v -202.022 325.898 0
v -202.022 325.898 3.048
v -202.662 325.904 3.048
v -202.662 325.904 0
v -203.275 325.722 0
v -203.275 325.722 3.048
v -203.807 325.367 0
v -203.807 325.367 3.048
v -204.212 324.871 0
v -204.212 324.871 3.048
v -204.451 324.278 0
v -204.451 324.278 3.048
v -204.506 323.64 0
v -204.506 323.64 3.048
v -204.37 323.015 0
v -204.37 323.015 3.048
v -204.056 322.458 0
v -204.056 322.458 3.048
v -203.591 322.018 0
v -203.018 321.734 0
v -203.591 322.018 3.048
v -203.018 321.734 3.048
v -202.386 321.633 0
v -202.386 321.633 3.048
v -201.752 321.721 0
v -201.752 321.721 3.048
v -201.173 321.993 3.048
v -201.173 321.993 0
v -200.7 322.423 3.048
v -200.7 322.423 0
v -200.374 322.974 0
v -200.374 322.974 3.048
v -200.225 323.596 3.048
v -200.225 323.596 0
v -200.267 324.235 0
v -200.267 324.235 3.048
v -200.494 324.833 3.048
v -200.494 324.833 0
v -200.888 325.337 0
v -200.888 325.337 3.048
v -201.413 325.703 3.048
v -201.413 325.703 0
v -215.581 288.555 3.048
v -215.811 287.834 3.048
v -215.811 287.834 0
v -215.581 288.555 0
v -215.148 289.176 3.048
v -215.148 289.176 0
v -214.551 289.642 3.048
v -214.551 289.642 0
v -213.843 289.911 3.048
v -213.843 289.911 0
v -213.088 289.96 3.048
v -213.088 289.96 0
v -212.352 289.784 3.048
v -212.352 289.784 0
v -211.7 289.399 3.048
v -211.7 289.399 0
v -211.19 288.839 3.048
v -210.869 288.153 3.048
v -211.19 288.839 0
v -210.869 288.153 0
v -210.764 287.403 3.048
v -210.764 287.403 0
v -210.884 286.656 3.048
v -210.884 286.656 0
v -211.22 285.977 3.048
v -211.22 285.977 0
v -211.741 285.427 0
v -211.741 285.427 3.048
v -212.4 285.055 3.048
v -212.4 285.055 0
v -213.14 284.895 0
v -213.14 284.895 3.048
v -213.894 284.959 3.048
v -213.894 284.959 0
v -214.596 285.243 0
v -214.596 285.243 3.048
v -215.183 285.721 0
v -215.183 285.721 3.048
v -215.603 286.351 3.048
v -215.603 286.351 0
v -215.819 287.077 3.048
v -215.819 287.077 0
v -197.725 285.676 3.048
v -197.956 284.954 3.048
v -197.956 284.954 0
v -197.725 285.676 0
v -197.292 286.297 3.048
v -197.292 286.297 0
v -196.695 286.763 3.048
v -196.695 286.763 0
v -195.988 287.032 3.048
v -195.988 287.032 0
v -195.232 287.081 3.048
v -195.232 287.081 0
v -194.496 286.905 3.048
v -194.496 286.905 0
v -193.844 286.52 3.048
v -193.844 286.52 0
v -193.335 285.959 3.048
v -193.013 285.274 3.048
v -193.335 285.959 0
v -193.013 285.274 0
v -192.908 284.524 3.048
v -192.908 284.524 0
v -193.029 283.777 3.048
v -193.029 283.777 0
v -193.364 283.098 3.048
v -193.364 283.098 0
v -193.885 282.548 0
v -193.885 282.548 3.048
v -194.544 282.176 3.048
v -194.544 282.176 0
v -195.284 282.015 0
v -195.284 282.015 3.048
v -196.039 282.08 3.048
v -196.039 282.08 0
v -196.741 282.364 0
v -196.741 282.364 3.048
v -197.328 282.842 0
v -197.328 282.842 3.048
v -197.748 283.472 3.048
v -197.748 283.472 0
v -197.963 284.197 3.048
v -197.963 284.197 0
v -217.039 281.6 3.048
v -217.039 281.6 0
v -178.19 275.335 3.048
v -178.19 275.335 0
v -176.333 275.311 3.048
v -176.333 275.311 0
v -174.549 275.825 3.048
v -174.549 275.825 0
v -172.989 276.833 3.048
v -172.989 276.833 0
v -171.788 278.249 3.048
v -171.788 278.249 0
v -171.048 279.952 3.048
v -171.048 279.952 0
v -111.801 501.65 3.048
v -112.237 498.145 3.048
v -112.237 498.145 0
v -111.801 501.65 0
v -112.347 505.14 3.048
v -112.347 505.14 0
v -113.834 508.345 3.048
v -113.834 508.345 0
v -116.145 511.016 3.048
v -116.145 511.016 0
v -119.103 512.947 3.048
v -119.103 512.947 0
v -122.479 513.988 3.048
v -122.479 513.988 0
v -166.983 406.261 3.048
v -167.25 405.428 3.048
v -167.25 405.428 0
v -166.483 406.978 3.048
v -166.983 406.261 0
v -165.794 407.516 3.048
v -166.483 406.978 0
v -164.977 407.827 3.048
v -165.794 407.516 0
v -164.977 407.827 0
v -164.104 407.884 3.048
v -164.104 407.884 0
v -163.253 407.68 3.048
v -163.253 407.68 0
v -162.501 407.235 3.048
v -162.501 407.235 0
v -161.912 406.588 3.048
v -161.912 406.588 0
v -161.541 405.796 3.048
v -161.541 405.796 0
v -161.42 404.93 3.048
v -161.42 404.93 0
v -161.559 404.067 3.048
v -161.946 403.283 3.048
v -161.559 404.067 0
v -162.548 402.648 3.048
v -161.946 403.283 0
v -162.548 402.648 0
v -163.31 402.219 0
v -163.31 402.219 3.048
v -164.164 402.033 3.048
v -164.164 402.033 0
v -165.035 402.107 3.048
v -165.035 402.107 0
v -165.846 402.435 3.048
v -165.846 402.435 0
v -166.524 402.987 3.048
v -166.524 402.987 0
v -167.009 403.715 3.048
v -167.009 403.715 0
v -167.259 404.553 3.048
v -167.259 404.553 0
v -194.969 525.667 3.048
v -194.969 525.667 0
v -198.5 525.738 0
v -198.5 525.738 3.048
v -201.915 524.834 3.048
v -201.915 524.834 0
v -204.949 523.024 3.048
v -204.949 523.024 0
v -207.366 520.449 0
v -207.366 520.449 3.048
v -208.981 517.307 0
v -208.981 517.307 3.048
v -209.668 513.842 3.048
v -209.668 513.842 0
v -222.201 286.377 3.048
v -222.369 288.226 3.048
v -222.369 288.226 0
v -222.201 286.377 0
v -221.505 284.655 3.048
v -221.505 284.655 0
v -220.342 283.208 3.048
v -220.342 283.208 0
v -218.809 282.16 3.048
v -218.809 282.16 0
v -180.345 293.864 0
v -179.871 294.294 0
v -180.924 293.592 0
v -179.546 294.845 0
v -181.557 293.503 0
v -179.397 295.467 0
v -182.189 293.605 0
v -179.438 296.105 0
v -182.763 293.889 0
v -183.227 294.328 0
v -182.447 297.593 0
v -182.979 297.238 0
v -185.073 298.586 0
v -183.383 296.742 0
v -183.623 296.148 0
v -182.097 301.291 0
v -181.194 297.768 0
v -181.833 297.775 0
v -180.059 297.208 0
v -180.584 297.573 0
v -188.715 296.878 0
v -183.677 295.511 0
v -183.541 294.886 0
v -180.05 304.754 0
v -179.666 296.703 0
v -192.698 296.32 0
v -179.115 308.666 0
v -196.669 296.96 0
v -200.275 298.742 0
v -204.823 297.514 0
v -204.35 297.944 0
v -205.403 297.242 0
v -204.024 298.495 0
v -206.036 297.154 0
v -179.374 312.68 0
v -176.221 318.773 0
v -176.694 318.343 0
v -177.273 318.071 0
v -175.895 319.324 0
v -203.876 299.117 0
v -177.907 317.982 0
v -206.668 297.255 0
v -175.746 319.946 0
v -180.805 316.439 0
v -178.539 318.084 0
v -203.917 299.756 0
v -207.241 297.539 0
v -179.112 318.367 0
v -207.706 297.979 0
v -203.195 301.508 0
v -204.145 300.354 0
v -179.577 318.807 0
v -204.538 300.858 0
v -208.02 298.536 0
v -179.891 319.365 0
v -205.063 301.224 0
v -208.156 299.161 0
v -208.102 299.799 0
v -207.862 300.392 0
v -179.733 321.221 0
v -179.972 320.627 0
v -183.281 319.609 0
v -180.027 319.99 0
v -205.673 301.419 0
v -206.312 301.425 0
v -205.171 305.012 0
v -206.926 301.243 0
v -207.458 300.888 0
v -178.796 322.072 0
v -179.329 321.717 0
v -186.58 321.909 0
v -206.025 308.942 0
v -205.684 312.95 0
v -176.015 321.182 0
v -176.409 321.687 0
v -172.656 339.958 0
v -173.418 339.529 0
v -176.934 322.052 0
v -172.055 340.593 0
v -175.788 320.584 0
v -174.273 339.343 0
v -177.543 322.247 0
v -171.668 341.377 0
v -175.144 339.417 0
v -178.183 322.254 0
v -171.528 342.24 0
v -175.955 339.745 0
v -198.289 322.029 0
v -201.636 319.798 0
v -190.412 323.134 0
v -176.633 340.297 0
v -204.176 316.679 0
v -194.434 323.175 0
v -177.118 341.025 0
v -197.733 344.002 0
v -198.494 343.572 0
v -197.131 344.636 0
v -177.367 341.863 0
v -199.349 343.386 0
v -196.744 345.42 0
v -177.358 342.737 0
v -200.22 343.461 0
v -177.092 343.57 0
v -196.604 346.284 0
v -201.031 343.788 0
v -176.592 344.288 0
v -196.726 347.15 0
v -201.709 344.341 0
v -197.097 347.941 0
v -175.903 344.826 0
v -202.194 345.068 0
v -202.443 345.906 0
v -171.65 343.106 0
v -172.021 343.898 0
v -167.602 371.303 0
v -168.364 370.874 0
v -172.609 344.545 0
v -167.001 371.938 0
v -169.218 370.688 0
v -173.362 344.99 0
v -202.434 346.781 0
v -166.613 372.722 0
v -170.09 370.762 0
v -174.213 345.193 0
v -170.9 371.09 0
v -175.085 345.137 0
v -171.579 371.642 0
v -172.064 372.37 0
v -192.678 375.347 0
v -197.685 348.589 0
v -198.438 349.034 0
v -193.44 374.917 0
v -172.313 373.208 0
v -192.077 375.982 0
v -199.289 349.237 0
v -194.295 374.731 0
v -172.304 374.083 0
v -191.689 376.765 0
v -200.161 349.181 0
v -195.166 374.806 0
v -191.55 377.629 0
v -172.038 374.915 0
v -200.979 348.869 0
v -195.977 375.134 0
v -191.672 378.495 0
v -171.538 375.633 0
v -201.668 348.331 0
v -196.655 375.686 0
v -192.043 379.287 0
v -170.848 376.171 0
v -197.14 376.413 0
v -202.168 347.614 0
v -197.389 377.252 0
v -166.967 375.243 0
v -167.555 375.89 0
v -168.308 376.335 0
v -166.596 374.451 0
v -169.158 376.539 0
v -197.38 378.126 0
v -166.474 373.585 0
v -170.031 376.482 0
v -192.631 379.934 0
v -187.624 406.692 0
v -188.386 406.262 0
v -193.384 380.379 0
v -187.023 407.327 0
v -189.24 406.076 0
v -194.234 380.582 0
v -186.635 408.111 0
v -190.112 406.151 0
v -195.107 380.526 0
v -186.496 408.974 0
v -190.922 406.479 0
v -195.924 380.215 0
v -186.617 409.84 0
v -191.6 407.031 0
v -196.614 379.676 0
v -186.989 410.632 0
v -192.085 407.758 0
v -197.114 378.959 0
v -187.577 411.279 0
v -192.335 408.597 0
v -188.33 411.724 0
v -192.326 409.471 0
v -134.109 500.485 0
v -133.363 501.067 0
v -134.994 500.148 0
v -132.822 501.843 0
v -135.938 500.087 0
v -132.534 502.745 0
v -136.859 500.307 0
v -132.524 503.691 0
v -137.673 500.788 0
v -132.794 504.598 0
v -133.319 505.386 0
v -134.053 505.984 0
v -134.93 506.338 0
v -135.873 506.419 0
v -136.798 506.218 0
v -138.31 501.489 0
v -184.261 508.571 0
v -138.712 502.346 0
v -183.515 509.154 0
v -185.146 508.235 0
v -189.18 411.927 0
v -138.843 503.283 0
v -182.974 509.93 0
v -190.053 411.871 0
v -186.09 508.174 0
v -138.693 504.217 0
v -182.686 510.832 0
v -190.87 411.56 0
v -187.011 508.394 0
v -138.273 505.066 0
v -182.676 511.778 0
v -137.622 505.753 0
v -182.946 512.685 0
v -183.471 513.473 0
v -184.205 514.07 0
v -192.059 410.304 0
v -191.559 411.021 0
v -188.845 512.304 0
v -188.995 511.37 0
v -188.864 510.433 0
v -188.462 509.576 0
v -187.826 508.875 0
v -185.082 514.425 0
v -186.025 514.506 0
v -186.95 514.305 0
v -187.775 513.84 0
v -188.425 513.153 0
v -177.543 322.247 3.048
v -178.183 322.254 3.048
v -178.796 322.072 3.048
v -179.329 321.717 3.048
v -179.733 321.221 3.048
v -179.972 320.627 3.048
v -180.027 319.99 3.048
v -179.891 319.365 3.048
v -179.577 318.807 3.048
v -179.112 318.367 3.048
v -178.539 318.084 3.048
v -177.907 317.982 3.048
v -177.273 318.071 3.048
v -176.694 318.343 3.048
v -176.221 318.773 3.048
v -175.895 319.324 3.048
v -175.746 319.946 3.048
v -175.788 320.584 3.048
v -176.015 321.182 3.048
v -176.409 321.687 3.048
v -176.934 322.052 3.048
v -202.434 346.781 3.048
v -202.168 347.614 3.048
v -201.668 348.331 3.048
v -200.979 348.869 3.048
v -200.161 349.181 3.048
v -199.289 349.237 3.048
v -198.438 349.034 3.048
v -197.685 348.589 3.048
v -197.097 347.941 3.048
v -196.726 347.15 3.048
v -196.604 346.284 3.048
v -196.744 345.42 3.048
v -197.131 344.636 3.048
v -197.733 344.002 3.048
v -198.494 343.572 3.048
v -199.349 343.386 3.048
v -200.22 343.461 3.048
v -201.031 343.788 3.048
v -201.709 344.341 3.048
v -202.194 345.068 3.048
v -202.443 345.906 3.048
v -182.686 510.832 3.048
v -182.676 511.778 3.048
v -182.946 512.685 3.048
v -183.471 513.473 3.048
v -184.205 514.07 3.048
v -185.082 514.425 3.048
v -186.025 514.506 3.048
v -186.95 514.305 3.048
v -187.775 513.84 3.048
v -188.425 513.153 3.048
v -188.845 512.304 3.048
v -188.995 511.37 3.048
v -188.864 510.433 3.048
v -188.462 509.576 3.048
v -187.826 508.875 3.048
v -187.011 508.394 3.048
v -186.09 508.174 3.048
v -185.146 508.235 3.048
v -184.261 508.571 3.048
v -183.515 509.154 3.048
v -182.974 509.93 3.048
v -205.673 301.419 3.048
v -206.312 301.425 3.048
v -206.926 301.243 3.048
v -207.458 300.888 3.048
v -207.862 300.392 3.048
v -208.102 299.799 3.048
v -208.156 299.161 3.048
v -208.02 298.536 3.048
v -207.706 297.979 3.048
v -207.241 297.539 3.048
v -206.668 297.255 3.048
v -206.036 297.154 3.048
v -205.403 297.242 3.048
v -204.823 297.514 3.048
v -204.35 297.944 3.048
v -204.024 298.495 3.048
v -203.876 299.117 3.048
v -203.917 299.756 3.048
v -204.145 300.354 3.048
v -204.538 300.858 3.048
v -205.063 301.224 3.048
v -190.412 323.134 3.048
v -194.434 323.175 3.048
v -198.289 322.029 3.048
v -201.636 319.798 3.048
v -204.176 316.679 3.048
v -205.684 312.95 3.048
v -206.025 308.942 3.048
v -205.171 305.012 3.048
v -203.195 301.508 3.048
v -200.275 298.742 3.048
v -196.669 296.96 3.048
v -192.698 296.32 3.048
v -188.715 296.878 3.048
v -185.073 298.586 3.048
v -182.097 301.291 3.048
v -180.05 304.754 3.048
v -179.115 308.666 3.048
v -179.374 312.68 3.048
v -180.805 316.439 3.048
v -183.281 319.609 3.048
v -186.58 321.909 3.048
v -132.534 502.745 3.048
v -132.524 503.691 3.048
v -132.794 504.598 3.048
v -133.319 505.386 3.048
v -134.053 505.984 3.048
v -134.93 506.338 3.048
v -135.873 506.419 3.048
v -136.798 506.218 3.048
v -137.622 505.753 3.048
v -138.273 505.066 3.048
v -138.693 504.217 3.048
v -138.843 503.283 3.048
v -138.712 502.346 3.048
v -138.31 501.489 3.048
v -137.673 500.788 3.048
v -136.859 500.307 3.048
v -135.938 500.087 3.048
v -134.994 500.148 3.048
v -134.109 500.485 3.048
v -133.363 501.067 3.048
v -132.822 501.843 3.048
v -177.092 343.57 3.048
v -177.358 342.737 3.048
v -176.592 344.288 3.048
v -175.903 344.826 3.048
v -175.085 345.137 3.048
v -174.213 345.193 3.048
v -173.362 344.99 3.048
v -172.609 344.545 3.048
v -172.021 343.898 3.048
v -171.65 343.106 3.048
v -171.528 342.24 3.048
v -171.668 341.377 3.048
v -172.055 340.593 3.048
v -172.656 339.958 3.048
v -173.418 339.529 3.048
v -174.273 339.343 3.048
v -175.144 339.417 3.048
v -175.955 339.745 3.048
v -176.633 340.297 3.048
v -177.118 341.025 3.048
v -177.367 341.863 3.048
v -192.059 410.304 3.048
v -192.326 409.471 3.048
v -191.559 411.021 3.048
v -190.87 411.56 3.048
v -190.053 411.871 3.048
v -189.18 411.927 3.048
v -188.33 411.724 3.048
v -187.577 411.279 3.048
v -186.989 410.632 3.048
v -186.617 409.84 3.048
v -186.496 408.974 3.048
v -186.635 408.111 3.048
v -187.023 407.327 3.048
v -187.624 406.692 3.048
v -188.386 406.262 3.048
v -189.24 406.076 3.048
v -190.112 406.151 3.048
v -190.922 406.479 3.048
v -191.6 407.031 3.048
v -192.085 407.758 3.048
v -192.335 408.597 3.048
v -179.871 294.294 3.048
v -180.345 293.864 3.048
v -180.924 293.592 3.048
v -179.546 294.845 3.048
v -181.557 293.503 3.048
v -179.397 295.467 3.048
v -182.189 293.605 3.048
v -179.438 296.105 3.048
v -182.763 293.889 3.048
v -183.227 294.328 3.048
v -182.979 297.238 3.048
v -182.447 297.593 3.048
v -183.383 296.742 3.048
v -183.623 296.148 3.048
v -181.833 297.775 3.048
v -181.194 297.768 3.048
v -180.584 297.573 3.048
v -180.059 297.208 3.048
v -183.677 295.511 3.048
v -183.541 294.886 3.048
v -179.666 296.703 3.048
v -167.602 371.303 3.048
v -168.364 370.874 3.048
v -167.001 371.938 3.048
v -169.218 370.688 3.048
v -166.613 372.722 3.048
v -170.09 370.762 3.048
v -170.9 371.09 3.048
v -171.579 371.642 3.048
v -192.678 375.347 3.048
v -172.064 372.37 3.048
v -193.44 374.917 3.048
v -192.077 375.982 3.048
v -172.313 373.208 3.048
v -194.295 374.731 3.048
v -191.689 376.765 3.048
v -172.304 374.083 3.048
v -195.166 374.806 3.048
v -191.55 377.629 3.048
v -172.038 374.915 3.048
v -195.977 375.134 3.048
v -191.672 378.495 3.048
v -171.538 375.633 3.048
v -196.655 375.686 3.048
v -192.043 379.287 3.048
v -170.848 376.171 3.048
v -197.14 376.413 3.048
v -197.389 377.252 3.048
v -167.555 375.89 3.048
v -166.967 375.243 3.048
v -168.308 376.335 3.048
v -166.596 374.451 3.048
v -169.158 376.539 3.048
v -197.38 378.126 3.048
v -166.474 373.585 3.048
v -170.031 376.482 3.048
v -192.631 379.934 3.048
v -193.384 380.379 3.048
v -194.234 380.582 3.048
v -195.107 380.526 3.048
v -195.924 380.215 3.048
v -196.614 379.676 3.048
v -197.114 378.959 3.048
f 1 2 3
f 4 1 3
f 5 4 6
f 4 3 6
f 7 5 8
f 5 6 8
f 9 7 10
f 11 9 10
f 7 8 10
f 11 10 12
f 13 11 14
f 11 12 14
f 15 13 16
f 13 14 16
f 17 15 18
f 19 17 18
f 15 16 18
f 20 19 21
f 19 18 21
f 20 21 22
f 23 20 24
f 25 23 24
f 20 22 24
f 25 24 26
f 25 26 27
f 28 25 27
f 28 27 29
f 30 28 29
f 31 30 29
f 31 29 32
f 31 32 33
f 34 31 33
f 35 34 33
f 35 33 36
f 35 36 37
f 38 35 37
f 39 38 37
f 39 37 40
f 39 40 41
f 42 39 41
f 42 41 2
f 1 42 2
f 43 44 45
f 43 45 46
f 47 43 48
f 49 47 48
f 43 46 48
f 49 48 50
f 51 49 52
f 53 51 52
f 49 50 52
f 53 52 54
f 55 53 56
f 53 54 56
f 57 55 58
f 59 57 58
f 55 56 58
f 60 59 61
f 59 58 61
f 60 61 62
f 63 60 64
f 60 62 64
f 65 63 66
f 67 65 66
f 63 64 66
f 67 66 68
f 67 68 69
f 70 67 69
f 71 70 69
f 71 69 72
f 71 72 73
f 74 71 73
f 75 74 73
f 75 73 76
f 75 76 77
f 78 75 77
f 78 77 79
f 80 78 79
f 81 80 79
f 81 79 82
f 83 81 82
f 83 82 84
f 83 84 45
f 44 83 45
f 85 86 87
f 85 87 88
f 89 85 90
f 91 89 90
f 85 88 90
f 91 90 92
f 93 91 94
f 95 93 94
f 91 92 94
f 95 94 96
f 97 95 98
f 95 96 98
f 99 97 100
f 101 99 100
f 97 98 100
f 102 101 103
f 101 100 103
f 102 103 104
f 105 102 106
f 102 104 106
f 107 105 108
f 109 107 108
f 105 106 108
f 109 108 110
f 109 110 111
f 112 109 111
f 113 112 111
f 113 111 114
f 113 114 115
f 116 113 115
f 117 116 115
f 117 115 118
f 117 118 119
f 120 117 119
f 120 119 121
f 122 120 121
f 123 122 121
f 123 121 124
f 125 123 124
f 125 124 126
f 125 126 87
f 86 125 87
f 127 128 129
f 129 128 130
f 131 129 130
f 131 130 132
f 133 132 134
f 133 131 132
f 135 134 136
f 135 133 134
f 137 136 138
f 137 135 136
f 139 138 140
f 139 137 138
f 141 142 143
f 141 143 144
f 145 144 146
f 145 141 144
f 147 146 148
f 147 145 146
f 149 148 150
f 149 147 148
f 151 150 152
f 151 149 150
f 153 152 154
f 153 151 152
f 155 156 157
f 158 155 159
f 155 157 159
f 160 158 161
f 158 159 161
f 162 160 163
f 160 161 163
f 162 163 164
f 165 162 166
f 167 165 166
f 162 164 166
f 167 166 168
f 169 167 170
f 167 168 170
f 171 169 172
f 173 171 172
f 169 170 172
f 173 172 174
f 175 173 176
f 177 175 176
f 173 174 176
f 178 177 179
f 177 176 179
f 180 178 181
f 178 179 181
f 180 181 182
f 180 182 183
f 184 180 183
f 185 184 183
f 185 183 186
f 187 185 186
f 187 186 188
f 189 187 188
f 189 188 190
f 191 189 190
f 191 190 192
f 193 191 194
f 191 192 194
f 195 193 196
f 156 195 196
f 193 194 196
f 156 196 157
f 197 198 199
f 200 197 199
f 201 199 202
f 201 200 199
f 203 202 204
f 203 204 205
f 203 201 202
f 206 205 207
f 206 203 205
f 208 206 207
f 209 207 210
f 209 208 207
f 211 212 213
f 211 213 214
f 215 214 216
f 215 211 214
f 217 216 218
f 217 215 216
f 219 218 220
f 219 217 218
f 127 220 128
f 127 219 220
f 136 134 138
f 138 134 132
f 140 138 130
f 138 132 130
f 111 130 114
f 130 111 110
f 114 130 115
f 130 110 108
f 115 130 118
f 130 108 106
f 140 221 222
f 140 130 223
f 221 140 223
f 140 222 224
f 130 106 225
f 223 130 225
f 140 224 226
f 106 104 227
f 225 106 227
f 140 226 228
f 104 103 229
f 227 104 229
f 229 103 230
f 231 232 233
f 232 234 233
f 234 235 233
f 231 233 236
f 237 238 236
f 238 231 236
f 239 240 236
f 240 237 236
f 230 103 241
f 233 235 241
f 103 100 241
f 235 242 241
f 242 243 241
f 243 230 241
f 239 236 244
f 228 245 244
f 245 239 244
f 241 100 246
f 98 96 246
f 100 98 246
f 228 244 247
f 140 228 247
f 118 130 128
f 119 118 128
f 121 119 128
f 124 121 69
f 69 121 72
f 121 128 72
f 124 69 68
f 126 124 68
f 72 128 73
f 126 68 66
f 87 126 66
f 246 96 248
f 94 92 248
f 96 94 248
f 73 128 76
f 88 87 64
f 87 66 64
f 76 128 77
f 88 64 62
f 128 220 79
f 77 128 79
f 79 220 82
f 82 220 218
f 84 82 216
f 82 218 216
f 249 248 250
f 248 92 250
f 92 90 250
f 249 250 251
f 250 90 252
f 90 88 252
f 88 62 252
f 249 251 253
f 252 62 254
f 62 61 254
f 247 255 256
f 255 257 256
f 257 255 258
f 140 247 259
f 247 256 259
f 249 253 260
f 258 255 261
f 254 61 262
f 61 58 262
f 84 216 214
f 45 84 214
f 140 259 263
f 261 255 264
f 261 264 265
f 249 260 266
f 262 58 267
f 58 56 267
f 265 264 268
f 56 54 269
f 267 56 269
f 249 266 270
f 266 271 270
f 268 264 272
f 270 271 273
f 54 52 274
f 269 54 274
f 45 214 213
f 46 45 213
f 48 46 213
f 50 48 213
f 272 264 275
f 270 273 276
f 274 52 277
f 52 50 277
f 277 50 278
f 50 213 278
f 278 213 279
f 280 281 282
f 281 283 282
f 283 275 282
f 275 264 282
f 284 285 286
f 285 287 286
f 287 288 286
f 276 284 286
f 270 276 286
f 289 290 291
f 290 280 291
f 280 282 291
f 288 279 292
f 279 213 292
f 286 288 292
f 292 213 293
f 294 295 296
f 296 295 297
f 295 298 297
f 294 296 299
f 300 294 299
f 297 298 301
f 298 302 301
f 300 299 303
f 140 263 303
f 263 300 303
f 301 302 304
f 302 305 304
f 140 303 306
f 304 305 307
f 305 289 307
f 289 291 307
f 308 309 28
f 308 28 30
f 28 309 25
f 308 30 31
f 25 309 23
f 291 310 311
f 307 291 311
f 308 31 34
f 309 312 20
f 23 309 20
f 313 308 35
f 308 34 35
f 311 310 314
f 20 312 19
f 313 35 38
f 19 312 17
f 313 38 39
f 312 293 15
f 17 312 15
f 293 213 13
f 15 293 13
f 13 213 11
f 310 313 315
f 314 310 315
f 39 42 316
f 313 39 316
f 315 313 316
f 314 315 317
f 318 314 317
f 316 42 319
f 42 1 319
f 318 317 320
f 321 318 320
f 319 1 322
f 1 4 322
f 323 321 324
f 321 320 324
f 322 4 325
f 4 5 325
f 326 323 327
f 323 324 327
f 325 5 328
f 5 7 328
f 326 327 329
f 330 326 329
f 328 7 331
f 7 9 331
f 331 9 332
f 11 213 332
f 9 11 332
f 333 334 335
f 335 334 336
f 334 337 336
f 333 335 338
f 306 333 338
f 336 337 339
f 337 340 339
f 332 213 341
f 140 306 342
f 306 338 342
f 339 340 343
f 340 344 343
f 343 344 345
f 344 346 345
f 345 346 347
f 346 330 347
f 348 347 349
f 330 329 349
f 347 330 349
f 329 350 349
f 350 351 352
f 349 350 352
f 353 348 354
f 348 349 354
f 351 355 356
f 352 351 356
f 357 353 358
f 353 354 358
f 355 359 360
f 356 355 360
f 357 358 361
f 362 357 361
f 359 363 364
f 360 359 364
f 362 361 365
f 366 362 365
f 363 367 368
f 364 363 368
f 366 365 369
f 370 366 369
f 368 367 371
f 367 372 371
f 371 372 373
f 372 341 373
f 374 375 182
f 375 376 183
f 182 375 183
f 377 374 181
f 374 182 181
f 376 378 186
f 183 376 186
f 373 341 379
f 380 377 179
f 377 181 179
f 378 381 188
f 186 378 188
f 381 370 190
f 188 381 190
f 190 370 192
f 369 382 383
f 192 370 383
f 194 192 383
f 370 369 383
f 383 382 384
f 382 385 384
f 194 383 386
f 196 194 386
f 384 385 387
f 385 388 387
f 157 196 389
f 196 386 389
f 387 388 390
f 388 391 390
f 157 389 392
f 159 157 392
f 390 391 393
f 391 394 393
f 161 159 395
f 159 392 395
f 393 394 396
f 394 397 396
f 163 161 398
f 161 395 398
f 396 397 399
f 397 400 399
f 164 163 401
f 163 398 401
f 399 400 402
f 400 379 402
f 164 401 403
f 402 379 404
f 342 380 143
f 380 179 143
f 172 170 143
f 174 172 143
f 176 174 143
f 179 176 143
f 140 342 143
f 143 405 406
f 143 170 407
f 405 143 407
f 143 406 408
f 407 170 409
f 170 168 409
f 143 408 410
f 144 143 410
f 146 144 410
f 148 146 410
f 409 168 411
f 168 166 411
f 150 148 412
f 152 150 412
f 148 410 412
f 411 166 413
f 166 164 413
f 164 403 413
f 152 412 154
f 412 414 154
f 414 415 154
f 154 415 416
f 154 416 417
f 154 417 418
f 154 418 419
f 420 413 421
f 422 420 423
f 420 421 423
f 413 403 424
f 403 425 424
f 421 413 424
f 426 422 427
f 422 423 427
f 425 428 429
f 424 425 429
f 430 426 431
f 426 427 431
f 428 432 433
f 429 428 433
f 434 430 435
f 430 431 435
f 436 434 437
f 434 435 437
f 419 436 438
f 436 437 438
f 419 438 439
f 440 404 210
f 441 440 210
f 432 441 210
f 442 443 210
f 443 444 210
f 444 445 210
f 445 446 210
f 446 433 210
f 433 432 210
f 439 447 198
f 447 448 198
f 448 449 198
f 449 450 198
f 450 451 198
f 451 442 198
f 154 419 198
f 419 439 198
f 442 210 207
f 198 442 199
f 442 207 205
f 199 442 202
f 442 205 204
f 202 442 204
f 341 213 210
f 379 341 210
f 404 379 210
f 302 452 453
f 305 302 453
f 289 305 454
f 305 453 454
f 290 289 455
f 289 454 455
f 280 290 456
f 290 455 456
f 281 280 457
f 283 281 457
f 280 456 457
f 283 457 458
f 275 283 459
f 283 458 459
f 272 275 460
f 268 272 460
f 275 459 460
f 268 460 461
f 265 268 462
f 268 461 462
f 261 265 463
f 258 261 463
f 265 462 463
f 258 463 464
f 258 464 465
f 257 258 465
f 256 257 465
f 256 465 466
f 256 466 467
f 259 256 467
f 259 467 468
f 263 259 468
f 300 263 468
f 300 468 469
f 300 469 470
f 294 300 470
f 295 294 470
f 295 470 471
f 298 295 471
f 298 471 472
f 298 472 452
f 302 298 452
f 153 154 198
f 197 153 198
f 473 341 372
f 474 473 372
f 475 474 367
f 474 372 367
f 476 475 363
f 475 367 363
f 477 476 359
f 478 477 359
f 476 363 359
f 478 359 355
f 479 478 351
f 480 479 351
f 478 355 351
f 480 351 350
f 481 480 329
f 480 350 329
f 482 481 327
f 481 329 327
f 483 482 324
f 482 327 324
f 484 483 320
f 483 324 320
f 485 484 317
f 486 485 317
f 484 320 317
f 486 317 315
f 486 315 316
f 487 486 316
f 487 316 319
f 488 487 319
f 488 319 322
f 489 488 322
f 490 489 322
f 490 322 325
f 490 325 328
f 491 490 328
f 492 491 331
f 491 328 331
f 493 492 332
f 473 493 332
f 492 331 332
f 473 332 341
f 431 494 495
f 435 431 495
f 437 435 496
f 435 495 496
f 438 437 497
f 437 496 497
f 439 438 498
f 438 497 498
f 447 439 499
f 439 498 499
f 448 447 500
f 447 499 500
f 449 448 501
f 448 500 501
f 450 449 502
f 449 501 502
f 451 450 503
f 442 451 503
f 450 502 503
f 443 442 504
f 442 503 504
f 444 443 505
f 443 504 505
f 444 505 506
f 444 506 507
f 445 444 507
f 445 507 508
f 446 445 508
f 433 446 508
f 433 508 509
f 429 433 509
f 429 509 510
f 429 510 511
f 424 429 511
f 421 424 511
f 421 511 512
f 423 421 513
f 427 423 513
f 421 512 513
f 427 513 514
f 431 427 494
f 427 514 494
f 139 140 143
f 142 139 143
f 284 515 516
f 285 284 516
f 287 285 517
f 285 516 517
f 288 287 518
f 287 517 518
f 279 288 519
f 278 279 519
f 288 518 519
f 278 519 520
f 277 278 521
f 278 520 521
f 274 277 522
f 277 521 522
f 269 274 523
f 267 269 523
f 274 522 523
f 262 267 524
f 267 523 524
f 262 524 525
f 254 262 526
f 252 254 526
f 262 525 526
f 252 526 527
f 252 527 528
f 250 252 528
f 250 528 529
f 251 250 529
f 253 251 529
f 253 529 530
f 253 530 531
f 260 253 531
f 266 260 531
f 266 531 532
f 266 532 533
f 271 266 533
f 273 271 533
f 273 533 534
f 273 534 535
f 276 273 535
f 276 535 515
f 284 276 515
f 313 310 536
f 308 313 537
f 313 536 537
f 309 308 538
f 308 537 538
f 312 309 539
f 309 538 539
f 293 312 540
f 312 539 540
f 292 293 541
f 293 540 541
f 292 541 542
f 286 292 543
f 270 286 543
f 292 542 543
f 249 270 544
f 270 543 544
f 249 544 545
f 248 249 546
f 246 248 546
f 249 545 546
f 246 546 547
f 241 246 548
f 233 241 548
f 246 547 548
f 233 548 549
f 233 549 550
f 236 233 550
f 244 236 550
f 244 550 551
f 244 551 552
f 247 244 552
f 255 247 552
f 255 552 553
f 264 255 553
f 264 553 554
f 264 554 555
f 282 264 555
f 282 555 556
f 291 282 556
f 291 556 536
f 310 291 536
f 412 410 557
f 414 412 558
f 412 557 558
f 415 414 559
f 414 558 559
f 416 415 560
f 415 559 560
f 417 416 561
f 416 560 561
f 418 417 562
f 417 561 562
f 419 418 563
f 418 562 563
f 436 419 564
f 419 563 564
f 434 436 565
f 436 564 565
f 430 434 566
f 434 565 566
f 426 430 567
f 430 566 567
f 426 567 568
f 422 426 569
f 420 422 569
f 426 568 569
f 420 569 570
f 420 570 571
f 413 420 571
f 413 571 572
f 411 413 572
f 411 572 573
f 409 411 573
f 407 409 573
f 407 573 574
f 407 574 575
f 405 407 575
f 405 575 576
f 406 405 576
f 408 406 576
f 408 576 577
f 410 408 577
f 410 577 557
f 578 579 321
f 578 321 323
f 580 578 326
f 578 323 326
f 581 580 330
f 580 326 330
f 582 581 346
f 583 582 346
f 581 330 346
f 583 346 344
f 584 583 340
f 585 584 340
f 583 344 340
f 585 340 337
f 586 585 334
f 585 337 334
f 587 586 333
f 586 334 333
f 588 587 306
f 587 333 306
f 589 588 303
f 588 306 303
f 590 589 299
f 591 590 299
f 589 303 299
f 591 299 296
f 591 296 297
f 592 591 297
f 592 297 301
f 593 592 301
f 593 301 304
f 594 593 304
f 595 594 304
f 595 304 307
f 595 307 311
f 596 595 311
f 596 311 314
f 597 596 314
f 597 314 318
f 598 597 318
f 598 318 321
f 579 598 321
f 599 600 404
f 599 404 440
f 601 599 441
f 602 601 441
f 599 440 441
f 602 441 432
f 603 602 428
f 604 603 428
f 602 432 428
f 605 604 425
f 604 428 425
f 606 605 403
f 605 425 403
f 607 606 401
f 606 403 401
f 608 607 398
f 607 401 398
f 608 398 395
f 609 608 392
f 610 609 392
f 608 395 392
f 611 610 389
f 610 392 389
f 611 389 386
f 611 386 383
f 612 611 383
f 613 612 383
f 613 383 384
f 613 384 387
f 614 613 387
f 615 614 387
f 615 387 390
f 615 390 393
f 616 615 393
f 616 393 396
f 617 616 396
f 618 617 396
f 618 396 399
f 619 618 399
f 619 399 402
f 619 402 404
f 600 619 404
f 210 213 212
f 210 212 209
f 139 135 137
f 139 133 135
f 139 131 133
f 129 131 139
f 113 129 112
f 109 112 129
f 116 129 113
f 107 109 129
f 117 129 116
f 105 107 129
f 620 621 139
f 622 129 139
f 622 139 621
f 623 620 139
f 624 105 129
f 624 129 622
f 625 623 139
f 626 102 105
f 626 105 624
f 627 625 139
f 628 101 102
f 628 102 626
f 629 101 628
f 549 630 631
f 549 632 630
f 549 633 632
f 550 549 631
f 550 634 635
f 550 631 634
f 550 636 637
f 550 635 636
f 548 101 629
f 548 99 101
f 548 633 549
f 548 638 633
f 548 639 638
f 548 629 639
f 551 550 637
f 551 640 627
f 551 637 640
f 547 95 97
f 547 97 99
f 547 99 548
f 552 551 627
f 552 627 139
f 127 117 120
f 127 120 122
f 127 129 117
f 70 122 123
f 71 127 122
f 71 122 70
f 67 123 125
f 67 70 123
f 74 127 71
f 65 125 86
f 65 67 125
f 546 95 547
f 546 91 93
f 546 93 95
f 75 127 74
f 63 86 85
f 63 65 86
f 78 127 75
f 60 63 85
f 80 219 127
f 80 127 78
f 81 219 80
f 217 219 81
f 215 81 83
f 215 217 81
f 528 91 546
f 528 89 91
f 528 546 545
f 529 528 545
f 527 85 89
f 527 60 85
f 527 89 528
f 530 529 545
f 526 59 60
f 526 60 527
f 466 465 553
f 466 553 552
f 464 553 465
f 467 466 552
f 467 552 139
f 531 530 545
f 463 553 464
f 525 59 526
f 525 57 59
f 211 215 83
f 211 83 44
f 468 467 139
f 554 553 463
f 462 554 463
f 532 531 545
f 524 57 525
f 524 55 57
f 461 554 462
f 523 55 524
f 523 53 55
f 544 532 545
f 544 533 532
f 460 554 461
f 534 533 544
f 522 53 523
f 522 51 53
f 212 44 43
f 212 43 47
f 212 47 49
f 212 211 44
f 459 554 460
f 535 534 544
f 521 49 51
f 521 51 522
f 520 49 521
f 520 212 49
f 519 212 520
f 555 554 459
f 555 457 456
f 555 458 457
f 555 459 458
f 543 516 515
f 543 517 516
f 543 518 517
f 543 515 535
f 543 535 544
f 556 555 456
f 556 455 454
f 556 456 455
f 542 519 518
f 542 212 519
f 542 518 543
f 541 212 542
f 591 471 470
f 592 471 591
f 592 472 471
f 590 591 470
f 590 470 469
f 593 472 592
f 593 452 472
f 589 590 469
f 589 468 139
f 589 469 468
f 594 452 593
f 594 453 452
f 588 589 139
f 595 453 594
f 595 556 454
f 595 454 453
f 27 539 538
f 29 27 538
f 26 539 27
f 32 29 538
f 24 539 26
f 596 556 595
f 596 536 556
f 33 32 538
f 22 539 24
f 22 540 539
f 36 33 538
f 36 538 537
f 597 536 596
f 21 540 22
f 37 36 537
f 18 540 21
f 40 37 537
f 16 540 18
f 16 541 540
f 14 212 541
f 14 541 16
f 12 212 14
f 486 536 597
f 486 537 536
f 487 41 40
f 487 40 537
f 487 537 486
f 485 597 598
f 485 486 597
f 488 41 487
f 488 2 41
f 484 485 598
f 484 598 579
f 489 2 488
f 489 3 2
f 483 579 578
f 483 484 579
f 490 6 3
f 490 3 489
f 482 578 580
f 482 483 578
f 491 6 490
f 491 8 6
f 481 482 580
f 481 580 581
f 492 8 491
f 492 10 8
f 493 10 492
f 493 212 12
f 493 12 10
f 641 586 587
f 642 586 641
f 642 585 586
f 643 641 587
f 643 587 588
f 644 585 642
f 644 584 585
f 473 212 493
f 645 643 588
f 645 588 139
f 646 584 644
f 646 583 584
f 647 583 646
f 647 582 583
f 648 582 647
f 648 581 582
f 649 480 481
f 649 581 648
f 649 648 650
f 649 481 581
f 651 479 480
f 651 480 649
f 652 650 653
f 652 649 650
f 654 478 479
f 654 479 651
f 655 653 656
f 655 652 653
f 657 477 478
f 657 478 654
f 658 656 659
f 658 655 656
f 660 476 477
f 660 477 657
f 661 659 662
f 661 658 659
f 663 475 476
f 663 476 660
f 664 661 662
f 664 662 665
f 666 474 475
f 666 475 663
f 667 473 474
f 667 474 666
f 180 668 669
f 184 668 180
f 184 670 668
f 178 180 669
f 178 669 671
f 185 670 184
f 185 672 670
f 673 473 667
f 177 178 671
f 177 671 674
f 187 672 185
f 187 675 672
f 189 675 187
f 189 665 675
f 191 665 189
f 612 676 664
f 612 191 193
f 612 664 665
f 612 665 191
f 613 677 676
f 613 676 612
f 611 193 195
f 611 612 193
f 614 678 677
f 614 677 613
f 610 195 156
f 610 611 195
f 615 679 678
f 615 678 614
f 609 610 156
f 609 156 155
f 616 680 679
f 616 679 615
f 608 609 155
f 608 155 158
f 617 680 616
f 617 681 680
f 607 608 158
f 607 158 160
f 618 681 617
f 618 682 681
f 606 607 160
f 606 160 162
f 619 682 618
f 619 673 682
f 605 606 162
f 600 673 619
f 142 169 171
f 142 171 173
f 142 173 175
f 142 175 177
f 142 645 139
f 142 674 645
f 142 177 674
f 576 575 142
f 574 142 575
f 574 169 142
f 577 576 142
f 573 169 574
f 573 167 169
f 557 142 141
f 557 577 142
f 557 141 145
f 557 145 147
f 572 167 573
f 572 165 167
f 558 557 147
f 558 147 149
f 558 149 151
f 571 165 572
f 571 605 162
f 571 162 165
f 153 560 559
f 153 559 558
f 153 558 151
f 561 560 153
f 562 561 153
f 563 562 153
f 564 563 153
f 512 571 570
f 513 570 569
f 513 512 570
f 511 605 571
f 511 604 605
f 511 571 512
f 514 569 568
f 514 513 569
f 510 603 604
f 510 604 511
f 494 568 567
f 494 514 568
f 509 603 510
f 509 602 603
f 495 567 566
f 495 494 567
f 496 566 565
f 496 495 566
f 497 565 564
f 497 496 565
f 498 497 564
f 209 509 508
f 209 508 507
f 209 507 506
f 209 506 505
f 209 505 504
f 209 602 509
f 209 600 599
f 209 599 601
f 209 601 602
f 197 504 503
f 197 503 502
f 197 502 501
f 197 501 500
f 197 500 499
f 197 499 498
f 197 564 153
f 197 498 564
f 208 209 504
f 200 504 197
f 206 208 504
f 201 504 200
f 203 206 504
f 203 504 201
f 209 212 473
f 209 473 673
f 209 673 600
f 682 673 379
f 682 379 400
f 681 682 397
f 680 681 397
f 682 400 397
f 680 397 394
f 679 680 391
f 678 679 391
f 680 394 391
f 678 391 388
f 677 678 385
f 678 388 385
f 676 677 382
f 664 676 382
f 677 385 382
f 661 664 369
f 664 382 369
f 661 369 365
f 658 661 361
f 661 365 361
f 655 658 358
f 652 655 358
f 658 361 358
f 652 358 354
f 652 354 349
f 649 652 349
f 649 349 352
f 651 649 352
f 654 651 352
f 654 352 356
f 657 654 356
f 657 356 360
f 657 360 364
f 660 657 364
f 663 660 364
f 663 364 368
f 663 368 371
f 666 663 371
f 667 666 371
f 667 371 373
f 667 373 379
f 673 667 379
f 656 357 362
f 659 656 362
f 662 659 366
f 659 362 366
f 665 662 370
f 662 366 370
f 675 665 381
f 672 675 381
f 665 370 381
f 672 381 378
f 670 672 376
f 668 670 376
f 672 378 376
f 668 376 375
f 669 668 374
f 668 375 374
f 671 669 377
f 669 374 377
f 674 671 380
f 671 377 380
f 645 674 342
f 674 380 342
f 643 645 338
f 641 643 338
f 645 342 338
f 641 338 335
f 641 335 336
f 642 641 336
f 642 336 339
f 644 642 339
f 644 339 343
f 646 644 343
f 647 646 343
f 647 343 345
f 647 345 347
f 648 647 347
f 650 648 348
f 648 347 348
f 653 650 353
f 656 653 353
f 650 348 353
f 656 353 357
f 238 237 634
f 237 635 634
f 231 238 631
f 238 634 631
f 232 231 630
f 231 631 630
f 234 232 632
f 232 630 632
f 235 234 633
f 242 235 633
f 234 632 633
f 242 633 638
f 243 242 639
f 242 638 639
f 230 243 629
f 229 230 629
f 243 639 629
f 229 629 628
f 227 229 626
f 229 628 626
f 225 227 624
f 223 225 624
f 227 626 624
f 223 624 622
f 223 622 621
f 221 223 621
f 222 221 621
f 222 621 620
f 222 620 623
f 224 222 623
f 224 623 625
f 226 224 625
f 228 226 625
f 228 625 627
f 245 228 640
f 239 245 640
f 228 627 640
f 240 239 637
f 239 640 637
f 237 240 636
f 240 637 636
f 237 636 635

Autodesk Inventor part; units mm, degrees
ref_plane "YZ Plane" through (0, 0, 0) normal (1, 0, 0) x (0, 1, 0)
ref_plane "XZ Plane" through (0, 0, 0) normal (0, 1, 0) x (-1, 0, 0)
ref_plane "Work Plane1" through (187.0611, 458.9587, 0) normal (0, 0, 1) x (0.1591916, 0.9872477, 0)
sketch "Sketch1" plane through (187.0611, 458.9587, 0) normal (0, 0, 1) x (0.1591916, 0.9872477, 0)
  line L0 (5.0953, 0.0423) -> (5.0108, 609.6423) projected
  line L1 (-36.1797, 0.0366) -> (-36.2642, 609.6366) projected
  line L2 (-87.0268, 299.6189) -> (-40.0368, 299.6189) projected
  line L3 (5.0667, 206.0736) -> (-239.4228, 300.8893)
  line L4 (-87.0268, 401.2189) -> (-239.4268, 401.2189) projected
  line L5 (5.0265, 496.0682) -> (-239.4268, 401.2189)
  circle A0 centre (-207.6768, 350.4189) radius 15.4305 construction
  circle A1 centre (-207.6768, 350.4189) radius 13.0556 construction
  circle A2 centre (-207.6767, 351.037) radius 12.7
  line L6 (5.0466, 351.0648) -> (-194.9767, 351.037)
  line L7 (-220.3767, 351.037) -> (-239.4267, 351.037)
  line L8 (-239.4267, 351.037) -> (-239.4267, 325.637)
  line L9 (-239.4267, 351.037) -> (-239.4267, 376.437)
  line L10 (-239.4267, 325.637) -> (5.0537, 300.2648)
  line L11 (-239.4267, 376.437) -> (5.0396, 401.8648)
  point P0 (-482.8845, 111.6133)
  point P1 (5.0526, 307.6736)
  point P2 (5.0406, 394.4682)
  point P3 (5.0304, 467.7016)
  point P4 (5.0628, 234.4154)
  point P5 (-239.4268, 372.8507)
  dimension "d0" = 101.6
  dimension "d1" = 101.6
  dimension "d2" = 233.2861
  dimension "d30" = 244.4764
  dimension "d35" = 25.4
  dimension "d38" = 25.4
  dimension "d39" = 25.4
  dimension "d40" = 200.0234
  dimension "d41" = 50.8
  dimension "d42" = 50.8
  dimension "d43" = 19.05
  dimension "d44" = 25.4277
  dimension "d45" = 25.3723
extrude "Plate1" add sketch "Sketch1" along normal blind 3.048 contours L10 L1 L6 L0 | L6 L1 L11 L0 | L10 L8 L7 A2 L6 L1 | L6 A2 L7 L9 L11 L1
sketch "Sketch2" plane through (187.0611, 458.9587, 3.048) normal (0, 0, 1) x (0.1591916, 0.9872477, 0)
  circle A0 centre (-195.4493, 362.9394) radius 2.1463 projected
  circle A1 centre (-220.1972, 362.6464) radius 2.1463 projected
  circle A2 centre (-219.9042, 337.8985) radius 2.1463 projected
  circle A3 centre (-195.1563, 338.1915) radius 2.1463 projected
  point P0 (-482.8845, 111.6133)
extrude "Extrusion1" cut sketch "Sketch2" against normal up to surface (3.048 mm away)
sketch "Sketch3" plane through (187.0611, 458.9587, 3.048) normal (0, 0, 1) x (0.1591916, 0.9872477, 0)
  circle A0 centre (-207.6767, 351.037) radius 12.7 projected
  circle A1 centre (-207.6767, 351.037) radius 13.4937
  point P0 (-482.8845, 111.6133)
  point P1 (-207.6768, 350.4189)
  dimension "d36" = 0.7937
extrude "Extrusion2" cut sketch "Sketch3" against normal up to surface (3.048 mm away)
sketch "Sketch5" plane through (187.0611, 458.9587, 3.048) normal (0, 0, 1) x (0.9872477, -0.1591916, 0)
  line L0 (-401.8648, 5.0396) -> (-300.2648, 5.0537) projected
  line L1 (-300.2648, 5.0537) -> (-401.8648, 5.0396) construction
  line L2 (-319.3169, 5.051) -> (-319.3151, -7.649) construction
  line L3 (-401.8648, 5.0396) -> (-376.437, -239.4267) projected
  line L4 (-319.3151, -7.649) -> (-301.583, -7.649)
  line L5 (-300.2648, 5.0537) -> (-325.637, -239.4267) projected
  circle A0 centre (-376.4648, -7.649) radius 3.175
  circle A1 centre (-325.6648, -7.649) radius 3.175
  line L6 (-319.3151, -7.649) -> (-322.4898, -7.649)
  line L7 (-328.8398, -7.649) -> (-373.2898, -7.649)
  line L8 (-379.6398, -7.649) -> (-400.545, -7.649)
  point P0 (-111.6133, -482.8845)
  point P1 (-351.0648, 5.0466)
  dimension "d47" = 12.7
  dimension "d48" = 12.7025
  dimension "d49" = 6.35
  dimension "d50" = 6.35
  dimension "d51" = 50.8
  dimension "d52" = 50.8
  dimension "d53" = 25.4
sketch "Sketch6" plane through (187.0611, 458.9587, 0) normal (0, 0, -1) x (-0.9872477, 0.1591916, 0)
  circle A0 centre (337.8985, -219.9042) radius 2.1463
  circle A1 centre (338.1915, -195.1563) radius 2.1463
  circle A2 centre (362.6464, -220.1972) radius 2.1463
  circle A3 centre (362.9394, -195.4493) radius 2.1463
  line L0 (325.637, -239.4267) -> (376.437, -239.4267)
  line L1 (300.2648, 5.0537) -> (325.637, -239.4267)
  line L2 (376.437, -239.4267) -> (401.8648, 5.0396)
  line L3 (401.8648, 5.0396) -> (300.2648, 5.0537)
  circle A4 centre (338.337, -172.7517) radius 2.9337
  circle A5 centre (338.337, -141.0017) radius 2.9337
  circle A6 centre (363.737, -141.0017) radius 2.9337
  circle A7 centre (363.737, -172.7517) radius 2.9337
  circle A8 centre (338.337, -109.2517) radius 2.9337
  circle A9 centre (363.737, -109.2517) radius 2.9337
  point P0 (111.6133, -482.8845)
extrude "Extrusion5" cut sketch "Sketch6" against normal up to next contours A4 | A5 | A6 | A7 | A8 | A9
sketch "Sketch7" plane through (187.0611, 458.9587, 0) normal (0, 0, -1) x (-0.9872477, 0.1591916, 0)
  circle A0 centre (367.9532, -233.0767) radius 2.54 projected
  circle A1 centre (349.8669, -233.0767) radius 2.54 projected
  point P0 (111.6133, -482.8845)
extrude "Extrusion6" cut sketch "Sketch7" against normal up to next
extrude "Extrusion7" cut sketch "Sketch5" against normal up to next contours A0 | A1
fillet "Fillet1" radius 12.7 2 edges at (-108.57, 511.7476, 1.524) (-208.8766, 527.9075, 1.524)
fillet "Fillet2" radius 6.35 2 edges at (-222.6902, 282.5108, 1.524) (-172.538, 274.4239, 1.524)
equation "\"BendRadius\" = Thickness"
equation "\"BendReliefWidth\" = Thickness"
equation "\"BendReliefDepth\" = 0.5 * Thickness"
equation "\"CornerReliefSize\" = 4 * Thickness"
equation "\"MinimumRemnant\" = 2 * Thickness"
equation "\"TransitionRadius\" = BendRadius"
equation "\"JacobiRadiusSize\" = BendRadius"
equation "\"GapSize\" = Thickness"
equation "\"d4\" = BendRadius"
equation "\"Thickness\" = 3.048"
properties part number "lifterMountMetal"
